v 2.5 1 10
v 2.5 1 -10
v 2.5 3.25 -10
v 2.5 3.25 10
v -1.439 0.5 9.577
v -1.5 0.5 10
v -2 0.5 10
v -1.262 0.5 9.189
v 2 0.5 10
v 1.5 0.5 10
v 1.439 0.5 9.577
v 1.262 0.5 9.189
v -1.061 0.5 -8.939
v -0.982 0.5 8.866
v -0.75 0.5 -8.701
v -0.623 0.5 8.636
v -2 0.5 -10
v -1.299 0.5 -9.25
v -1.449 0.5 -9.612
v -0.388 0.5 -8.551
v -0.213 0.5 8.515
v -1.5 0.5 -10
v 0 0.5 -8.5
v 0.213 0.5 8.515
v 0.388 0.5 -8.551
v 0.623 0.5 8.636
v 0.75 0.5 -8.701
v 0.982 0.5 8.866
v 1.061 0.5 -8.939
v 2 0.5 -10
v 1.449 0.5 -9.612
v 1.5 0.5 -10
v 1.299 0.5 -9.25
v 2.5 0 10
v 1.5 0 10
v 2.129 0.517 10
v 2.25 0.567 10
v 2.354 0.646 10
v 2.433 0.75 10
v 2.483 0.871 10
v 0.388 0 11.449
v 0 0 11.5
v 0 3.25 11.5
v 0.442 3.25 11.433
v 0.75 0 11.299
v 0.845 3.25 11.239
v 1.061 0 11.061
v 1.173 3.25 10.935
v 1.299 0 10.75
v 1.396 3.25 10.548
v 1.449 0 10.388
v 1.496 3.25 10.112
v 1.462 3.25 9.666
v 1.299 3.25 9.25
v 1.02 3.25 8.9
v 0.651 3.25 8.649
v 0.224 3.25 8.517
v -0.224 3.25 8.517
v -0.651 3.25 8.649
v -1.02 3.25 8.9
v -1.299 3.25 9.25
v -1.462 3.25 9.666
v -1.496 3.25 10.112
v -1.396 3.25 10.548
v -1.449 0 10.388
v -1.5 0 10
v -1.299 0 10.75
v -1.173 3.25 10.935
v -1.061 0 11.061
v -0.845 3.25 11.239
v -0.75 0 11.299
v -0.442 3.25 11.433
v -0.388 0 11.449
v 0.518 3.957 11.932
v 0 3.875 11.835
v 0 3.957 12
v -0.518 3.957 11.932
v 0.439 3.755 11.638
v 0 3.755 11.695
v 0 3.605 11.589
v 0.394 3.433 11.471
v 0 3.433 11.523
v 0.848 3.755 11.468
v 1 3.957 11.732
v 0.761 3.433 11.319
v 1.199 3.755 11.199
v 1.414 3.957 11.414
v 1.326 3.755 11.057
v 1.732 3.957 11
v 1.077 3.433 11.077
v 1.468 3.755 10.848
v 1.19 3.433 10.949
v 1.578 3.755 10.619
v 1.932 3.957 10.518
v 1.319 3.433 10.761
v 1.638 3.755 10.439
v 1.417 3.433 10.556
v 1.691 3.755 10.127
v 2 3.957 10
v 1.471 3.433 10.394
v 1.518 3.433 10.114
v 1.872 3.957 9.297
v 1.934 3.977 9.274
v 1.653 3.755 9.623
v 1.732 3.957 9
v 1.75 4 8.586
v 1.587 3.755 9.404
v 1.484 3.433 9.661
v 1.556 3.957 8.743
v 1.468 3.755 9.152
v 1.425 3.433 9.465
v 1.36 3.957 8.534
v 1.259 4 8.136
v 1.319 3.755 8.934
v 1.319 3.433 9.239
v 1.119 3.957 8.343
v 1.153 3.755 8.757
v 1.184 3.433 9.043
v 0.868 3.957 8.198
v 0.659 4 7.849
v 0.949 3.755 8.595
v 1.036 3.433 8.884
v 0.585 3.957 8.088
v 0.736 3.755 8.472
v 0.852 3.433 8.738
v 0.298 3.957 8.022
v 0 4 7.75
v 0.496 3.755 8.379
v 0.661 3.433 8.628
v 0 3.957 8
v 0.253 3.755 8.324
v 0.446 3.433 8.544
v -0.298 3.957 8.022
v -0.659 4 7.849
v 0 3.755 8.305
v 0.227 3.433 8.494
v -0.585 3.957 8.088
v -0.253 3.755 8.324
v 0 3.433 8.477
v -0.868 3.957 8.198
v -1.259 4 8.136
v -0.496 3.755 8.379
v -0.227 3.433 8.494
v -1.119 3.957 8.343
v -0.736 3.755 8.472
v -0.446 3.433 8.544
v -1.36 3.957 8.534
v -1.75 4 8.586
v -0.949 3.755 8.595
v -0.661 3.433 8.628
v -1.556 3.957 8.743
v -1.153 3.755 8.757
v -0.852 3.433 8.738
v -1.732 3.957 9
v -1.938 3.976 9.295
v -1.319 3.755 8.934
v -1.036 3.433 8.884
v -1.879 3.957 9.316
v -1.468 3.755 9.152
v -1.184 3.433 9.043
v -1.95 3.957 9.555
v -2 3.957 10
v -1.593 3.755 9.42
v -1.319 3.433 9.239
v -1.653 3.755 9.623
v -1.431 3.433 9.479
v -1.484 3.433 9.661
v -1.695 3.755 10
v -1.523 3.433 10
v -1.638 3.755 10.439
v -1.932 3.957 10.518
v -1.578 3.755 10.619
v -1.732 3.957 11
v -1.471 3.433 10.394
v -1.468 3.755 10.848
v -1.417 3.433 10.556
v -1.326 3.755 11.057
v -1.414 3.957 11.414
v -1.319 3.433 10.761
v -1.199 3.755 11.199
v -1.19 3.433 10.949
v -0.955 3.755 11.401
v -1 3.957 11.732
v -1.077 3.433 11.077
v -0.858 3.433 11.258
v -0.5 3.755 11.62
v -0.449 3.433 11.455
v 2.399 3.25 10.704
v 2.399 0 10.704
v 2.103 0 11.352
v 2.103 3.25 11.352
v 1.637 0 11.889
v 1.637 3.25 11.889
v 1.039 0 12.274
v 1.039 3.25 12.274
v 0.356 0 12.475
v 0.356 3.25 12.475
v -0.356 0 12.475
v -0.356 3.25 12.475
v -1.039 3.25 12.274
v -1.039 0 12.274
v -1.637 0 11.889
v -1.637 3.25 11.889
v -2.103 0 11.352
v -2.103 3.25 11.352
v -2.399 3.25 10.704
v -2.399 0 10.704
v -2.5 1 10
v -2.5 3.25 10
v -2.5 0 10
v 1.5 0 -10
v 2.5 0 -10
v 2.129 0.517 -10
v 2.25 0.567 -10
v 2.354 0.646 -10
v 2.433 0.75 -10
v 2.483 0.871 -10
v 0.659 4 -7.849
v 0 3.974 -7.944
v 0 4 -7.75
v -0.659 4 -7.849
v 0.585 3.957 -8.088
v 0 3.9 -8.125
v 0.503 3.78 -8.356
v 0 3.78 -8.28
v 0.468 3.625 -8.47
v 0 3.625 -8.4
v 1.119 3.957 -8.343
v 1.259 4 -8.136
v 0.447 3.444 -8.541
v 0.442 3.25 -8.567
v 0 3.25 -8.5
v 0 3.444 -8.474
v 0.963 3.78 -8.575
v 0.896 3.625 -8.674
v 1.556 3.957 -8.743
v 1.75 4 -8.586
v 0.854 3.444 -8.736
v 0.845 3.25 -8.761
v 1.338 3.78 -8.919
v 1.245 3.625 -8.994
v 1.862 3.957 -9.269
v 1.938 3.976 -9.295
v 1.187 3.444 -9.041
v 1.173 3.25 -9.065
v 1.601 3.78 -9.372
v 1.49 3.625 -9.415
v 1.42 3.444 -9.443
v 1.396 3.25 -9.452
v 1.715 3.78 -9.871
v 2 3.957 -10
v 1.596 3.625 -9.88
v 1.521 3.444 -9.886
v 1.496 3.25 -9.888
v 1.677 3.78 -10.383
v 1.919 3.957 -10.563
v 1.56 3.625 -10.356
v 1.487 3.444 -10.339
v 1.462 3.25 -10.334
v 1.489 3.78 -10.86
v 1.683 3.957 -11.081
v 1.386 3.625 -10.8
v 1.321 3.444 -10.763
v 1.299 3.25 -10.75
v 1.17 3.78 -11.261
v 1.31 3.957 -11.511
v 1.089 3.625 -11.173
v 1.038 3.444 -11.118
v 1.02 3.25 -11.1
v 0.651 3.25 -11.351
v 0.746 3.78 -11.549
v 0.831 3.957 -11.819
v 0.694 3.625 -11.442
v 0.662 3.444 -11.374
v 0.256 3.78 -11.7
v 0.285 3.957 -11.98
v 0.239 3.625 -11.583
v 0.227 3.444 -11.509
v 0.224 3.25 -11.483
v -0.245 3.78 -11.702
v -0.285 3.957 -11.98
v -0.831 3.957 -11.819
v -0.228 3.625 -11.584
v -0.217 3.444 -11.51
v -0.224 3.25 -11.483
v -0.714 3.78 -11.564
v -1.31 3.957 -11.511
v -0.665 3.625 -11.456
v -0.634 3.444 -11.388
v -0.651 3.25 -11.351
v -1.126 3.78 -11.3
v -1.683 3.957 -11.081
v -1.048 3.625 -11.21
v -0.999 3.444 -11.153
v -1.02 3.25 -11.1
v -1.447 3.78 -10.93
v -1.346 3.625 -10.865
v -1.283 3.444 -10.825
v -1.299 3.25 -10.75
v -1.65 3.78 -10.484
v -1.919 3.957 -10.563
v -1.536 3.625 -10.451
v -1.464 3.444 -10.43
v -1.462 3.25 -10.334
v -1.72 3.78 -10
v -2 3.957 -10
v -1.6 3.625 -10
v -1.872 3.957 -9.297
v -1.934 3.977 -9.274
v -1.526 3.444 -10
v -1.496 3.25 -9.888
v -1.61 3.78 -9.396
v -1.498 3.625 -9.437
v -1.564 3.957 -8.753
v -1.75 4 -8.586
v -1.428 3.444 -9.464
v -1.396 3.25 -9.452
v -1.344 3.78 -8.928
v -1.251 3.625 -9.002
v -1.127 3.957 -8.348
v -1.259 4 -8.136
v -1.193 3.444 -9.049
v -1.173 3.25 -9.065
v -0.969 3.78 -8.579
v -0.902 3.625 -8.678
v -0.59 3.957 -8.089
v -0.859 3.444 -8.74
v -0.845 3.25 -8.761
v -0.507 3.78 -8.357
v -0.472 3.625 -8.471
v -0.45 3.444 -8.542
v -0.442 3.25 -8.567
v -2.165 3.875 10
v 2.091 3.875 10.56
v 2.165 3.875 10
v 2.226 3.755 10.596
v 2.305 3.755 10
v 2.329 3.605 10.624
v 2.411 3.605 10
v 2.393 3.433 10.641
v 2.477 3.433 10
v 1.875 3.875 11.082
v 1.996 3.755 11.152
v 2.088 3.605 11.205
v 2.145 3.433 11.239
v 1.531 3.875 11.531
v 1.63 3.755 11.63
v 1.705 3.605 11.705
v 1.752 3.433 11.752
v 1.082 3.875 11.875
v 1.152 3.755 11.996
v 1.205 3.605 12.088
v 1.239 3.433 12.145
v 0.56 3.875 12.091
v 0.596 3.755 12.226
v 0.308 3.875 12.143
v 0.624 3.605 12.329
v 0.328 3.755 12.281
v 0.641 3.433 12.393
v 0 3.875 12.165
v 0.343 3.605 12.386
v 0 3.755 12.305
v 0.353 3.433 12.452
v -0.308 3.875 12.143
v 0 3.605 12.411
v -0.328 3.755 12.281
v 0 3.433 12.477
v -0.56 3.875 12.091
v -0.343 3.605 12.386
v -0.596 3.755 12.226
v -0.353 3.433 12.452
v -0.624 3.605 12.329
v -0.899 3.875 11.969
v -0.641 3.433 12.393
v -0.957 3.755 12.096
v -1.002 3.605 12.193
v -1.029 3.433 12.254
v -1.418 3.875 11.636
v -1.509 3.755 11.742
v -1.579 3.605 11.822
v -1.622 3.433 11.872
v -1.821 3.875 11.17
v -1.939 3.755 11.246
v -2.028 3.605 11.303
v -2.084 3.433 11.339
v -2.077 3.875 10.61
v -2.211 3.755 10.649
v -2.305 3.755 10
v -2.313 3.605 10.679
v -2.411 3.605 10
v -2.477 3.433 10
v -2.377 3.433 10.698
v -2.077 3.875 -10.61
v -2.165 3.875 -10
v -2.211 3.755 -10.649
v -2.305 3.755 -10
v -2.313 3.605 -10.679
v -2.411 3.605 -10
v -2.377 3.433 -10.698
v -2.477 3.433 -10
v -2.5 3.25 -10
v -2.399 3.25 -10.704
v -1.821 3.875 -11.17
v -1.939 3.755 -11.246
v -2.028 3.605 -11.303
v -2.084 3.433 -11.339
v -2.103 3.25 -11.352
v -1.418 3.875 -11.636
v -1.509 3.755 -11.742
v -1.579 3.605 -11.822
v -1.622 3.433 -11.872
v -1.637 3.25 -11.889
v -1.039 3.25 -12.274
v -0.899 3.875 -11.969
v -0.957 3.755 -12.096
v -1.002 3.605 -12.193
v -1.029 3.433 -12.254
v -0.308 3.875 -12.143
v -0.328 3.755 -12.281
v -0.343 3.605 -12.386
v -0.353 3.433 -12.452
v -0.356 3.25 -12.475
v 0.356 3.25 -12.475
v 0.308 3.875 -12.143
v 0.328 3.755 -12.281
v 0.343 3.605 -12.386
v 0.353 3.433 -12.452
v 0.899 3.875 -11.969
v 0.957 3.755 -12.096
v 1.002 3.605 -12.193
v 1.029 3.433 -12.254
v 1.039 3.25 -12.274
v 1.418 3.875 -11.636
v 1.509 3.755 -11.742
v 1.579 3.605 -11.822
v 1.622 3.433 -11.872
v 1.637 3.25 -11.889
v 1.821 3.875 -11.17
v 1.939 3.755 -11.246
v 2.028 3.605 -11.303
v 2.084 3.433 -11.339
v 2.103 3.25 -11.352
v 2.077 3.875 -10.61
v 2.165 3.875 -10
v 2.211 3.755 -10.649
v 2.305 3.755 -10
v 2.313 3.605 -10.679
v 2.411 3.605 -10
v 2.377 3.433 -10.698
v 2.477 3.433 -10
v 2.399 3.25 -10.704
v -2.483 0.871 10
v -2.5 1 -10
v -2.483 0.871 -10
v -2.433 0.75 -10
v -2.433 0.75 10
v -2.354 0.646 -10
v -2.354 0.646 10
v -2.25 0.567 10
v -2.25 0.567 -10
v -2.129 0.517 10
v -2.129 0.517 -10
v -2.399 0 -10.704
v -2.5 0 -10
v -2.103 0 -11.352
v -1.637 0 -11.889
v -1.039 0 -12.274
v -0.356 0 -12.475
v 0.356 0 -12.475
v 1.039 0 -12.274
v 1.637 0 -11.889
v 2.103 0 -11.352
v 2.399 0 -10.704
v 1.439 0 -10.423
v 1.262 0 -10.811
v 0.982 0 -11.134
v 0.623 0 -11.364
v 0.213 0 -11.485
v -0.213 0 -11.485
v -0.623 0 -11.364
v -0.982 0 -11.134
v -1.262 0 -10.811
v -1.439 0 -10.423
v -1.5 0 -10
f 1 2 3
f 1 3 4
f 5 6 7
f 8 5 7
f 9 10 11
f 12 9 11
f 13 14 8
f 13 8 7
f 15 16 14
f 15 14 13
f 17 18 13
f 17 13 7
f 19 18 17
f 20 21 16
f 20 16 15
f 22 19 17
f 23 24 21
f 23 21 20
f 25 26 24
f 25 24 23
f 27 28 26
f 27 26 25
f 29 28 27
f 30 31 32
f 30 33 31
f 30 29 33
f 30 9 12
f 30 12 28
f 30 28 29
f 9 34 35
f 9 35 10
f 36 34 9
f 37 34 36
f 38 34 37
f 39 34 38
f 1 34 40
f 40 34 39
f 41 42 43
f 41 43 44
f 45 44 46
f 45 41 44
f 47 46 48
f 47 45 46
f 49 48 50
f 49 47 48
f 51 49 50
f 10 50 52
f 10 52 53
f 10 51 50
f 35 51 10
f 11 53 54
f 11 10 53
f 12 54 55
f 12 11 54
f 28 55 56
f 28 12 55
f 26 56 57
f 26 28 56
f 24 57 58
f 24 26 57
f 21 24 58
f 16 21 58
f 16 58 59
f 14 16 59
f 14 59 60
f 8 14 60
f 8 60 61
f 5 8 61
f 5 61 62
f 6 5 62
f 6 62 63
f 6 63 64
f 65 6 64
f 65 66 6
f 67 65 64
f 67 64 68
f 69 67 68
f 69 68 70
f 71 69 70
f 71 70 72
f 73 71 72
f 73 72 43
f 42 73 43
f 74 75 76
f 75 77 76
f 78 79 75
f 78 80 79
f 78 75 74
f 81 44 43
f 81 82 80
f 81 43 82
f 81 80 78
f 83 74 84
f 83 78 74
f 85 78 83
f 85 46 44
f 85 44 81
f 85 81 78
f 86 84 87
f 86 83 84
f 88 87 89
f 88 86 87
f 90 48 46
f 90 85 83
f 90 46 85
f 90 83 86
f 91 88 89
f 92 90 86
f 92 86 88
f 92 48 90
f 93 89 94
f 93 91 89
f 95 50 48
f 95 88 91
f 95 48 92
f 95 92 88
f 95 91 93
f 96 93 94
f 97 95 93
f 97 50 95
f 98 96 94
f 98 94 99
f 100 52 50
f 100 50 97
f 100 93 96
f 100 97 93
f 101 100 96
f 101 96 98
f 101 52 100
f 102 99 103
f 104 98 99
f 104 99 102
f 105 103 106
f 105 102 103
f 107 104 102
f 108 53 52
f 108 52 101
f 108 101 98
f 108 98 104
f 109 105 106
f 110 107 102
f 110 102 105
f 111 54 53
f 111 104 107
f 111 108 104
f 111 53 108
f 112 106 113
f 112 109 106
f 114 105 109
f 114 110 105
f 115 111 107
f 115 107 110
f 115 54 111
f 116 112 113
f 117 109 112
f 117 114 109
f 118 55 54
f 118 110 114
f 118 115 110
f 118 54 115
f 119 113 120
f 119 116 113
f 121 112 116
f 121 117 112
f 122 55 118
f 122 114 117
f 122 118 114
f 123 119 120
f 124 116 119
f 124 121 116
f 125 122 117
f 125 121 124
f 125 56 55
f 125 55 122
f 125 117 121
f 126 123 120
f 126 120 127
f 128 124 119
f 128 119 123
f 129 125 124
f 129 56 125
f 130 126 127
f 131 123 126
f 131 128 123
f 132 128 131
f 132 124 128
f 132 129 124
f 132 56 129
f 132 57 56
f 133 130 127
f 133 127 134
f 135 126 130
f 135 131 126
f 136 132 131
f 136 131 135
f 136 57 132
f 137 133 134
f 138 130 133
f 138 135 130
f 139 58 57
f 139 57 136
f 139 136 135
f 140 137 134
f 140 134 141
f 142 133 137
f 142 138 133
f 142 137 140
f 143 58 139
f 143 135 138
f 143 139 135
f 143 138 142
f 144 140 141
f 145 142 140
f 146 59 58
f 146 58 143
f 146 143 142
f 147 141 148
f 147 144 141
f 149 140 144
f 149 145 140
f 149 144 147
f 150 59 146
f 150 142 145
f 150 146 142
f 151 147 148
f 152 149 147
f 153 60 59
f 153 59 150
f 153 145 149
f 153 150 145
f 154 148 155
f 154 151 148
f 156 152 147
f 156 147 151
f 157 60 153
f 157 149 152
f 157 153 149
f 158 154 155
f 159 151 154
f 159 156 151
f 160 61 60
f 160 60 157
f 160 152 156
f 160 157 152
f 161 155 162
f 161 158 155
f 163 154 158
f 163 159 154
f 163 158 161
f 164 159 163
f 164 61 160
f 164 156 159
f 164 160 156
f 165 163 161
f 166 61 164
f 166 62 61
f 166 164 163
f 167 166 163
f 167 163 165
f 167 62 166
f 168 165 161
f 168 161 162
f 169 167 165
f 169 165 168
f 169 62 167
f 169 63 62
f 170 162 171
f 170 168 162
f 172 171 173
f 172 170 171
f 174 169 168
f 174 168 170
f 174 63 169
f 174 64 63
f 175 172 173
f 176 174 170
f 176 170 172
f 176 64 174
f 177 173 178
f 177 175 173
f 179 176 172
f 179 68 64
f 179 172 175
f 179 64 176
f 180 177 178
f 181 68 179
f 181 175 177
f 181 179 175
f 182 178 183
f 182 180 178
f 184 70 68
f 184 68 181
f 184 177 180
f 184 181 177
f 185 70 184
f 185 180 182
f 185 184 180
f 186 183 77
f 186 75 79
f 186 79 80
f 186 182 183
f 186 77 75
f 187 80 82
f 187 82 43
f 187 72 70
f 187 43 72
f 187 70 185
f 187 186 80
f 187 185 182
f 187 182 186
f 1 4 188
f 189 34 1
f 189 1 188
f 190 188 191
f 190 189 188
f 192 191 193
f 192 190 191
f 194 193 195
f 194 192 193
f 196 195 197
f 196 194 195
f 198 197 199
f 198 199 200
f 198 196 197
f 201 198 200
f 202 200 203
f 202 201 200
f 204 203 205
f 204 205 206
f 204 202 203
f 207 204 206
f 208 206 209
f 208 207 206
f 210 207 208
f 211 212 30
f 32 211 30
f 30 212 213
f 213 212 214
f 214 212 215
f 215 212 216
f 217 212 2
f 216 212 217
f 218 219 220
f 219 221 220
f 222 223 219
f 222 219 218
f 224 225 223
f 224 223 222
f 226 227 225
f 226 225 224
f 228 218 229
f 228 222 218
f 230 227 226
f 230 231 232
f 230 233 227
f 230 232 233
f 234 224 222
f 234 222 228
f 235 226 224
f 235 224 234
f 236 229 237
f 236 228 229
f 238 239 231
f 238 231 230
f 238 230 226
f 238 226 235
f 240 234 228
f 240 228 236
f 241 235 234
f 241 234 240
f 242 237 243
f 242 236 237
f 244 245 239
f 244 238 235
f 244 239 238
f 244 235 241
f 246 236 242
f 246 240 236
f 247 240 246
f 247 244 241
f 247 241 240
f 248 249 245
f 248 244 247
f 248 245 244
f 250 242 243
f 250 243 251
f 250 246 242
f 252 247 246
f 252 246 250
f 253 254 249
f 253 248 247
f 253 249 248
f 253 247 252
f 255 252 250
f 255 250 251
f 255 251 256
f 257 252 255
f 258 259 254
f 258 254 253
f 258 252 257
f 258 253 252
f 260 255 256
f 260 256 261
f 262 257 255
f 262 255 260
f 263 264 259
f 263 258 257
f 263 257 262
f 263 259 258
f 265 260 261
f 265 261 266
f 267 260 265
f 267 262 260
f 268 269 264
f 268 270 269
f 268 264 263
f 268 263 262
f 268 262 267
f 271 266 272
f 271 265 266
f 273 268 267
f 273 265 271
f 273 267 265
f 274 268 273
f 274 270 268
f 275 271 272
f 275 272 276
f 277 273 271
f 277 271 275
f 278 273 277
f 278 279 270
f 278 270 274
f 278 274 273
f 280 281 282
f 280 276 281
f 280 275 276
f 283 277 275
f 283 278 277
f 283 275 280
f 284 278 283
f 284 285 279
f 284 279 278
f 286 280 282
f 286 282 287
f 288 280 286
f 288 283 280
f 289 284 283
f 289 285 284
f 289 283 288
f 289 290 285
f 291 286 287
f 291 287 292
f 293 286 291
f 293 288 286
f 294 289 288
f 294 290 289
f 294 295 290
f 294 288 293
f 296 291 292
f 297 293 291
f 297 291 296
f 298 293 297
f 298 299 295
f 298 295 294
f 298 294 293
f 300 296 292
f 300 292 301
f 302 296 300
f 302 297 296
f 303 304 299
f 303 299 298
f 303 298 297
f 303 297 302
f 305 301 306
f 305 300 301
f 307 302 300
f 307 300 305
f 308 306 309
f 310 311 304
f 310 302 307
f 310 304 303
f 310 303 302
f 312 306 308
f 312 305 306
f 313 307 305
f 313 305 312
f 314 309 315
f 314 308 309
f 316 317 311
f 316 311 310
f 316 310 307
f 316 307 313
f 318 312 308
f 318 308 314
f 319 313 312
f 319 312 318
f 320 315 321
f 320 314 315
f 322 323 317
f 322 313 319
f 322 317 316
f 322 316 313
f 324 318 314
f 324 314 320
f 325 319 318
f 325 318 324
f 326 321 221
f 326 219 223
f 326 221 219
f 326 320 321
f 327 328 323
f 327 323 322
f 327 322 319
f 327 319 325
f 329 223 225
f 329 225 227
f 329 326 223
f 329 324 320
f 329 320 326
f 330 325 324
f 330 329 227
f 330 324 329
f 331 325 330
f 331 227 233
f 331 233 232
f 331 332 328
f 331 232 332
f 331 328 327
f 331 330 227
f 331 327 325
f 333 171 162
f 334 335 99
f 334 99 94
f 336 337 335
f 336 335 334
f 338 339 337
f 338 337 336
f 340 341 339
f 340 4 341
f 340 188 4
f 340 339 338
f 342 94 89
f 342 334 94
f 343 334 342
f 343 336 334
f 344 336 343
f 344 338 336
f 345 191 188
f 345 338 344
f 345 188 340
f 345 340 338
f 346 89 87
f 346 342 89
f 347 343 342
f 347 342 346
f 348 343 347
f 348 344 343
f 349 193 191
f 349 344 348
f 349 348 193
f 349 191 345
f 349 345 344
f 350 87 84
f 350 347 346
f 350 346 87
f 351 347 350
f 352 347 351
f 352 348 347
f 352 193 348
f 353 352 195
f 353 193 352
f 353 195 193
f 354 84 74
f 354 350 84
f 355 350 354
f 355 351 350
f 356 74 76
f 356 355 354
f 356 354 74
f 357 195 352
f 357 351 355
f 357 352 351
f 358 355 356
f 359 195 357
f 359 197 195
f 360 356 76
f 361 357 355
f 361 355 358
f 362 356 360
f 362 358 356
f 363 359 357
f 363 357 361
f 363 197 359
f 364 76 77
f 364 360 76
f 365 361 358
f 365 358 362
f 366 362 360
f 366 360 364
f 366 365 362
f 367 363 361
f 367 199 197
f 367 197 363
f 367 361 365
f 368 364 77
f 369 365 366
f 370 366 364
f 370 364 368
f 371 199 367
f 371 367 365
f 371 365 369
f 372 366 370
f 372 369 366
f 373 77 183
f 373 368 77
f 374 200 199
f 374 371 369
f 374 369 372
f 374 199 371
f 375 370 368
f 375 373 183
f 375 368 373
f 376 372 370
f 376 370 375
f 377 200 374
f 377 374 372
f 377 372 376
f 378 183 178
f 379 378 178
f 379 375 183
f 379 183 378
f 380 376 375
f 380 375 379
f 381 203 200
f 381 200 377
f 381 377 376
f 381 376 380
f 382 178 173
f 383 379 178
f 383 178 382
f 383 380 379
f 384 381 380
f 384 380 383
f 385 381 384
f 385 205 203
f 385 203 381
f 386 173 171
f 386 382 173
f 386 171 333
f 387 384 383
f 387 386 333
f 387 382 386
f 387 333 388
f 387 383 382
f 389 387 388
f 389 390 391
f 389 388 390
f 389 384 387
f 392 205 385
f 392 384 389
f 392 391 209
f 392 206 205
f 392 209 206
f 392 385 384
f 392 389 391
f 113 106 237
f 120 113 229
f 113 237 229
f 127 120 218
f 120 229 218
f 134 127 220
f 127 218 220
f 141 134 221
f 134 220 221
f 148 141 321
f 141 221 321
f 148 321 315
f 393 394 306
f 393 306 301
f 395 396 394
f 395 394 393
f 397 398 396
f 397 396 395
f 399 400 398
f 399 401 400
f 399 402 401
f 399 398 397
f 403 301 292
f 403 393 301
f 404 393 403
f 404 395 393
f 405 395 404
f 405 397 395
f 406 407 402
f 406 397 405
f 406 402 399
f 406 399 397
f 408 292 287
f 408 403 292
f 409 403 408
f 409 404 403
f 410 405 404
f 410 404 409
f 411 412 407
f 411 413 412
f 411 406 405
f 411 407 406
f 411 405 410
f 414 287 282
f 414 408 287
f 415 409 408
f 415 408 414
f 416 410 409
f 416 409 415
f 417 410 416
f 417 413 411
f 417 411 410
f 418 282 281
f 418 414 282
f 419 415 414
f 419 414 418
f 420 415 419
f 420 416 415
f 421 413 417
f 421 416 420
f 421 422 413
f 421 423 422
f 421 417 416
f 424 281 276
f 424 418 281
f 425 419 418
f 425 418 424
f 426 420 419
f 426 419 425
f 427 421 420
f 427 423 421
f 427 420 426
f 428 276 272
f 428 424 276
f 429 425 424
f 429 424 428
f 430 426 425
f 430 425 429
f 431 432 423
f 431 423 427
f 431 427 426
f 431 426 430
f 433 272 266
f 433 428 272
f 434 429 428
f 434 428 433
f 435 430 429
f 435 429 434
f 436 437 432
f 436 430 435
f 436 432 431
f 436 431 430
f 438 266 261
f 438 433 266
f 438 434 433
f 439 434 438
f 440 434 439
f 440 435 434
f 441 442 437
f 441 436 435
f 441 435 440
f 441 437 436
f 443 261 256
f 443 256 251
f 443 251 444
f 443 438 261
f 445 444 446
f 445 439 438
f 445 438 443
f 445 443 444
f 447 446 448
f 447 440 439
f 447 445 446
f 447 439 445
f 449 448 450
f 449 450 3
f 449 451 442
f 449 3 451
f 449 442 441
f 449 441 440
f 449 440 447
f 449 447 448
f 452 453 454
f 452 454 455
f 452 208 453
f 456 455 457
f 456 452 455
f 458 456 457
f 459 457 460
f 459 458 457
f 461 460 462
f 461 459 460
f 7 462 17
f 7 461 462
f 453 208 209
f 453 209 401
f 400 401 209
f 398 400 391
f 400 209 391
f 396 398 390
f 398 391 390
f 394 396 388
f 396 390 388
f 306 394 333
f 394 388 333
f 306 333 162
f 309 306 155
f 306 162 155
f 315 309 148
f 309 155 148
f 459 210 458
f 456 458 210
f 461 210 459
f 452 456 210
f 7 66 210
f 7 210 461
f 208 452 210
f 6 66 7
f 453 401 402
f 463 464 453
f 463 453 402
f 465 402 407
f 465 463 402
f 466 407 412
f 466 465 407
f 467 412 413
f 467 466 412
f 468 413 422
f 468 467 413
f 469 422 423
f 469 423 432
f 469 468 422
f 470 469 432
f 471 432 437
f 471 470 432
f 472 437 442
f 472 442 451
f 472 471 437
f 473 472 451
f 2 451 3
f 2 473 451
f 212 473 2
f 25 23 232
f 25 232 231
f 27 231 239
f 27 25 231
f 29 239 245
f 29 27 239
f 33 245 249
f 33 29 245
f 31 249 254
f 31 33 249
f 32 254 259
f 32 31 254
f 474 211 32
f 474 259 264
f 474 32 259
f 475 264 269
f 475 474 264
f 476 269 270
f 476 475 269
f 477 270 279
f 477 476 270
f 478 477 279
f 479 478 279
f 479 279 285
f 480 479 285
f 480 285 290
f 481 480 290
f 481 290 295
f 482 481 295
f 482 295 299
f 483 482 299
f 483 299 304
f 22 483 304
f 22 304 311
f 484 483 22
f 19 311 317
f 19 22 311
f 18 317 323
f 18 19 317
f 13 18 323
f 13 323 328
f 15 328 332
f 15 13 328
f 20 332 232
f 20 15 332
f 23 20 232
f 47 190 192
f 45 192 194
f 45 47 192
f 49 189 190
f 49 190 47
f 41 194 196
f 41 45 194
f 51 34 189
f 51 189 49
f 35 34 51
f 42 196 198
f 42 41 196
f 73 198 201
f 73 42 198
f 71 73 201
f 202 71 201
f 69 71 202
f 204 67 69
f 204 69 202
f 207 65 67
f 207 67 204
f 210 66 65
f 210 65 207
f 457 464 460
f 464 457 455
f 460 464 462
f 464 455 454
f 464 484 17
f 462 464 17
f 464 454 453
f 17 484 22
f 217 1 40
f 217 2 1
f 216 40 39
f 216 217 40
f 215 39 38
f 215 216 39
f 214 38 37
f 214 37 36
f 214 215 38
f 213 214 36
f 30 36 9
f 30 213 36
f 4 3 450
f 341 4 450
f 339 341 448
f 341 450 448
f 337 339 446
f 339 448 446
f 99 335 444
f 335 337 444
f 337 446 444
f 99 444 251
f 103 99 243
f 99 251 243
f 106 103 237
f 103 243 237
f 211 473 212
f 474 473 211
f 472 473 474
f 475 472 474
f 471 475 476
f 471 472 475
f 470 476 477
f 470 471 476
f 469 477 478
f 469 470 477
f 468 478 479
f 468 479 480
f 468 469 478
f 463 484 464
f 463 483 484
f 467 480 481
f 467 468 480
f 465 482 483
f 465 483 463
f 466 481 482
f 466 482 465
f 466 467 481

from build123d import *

# Parameters (mm, degrees)
SKETCH1_R           = 1.5
BOSS_EXTRUDE1_DEPTH = 4
SKETCH2_W           = 20
SKETCH2_H           = 0.5
CUT_EXTRUDE1_DEPTH  = 15.044571905
FILLET1_R           = 0.5
FILLET2_R           = 0.75


with BuildPart() as part:
    # Sketch1 → Boss-Extrude1 (new body)
    with BuildSketch(Plane(origin=(0, 0, 0), x_dir=(1, 0, 0), z_dir=(0, 1, 0))):
        with BuildLine():
            Line((-2.5, -10), (-2.5, 10))
            ThreePointArc((-2.5, 10), (0, 12.5), (2.5, 10))
            Line((2.5, 10), (2.5, -10))
            ThreePointArc((2.5, -10), (0, -12.5), (-2.5, -10))
        make_face()
        with Locations(Location((0, -10, 0), (0, 0, 270))):
            Circle(SKETCH1_R, mode=Mode.SUBTRACT)
        with Locations(Location((0, 10, 0), (0, 0, 270))):
            Circle(SKETCH1_R, mode=Mode.SUBTRACT)
    extrude(amount=BOSS_EXTRUDE1_DEPTH)

    # Sketch2 → Cut-Extrude1 (cut, through all)
    with BuildSketch(Plane(origin=(2.5, 0, 0), x_dir=(0, 0, -1), z_dir=(1, 0, 0))):
        with Locations((0, 0.25)):
            Rectangle(SKETCH2_W, SKETCH2_H)
    extrude(amount=-CUT_EXTRUDE1_DEPTH, mode=Mode.SUBTRACT)

    # Fillet1
    fillet1_edges = [part.edges().sort_by_distance(p)[0] for p in [
        (2.5, 0.5, 0),
        (-2.5, 0.5, 0),
    ]]
    fillet(fillet1_edges, radius=FILLET1_R)

    # Fillet2
    # the kernel refuses this fillet: 0.75 mm, written as the material it takes off along each edge
    with BuildSketch(Plane(origin=(0, 4, 10), x_dir=(0, 0, 1), z_dir=(-1, 0, 0))) as fillet2_piece_1:
        with BuildLine():
            CenterArc((1.5 + FILLET2_R, -FILLET2_R), FILLET2_R, 90, 90)
            Line((1.5 + FILLET2_R, 0), (1.5, 0))
            Line((1.5, 0), (1.5, -FILLET2_R))
        make_face()
    revolve(axis=Axis((0, 4, 10), (0, 1, 0)), mode=Mode.SUBTRACT)
    with BuildSketch(Plane(origin=(0, 4, -10), x_dir=(-1, 0, 0), z_dir=(0, 0, 1))) as fillet2_piece_2:
        with BuildLine():
            CenterArc((2.5 - FILLET2_R, FILLET2_R), FILLET2_R, 270, 90)
            Line((2.5 - FILLET2_R, 0), (2.5, 0))
            Line((2.5, 0), (2.5, FILLET2_R))
        make_face()
    revolve(axis=Axis((0, 4, -10), (0, -1, 0)), revolution_arc=180, mode=Mode.SUBTRACT)
    with BuildSketch(Plane(origin=(0, 4, -10), x_dir=(0, 0, 1), z_dir=(-1, 0, 0))) as fillet2_piece_3:
        with BuildLine():
            CenterArc((1.5 + FILLET2_R, -FILLET2_R), FILLET2_R, 90, 90)
            Line((1.5 + FILLET2_R, 0), (1.5, 0))
            Line((1.5, 0), (1.5, -FILLET2_R))
        make_face()
    revolve(axis=Axis((0, 4, -10), (0, 1, 0)), mode=Mode.SUBTRACT)
    with BuildSketch(Plane(origin=(-2.5, 4, 10), x_dir=(1, 0, 0), z_dir=(0, 0, -1))) as fillet2_piece_4:
        with BuildLine():
            CenterArc((FILLET2_R, FILLET2_R), FILLET2_R, 180, 90)
            Line((0, FILLET2_R), (0, 0))
            Line((0, 0), (FILLET2_R, 0))
        make_face()
    extrude(amount=20, mode=Mode.SUBTRACT)
    with BuildSketch(Plane(origin=(0, 4, 10), x_dir=(1, 0, 0), z_dir=(0, 0, -1))) as fillet2_piece_5:
        with BuildLine():
            CenterArc((2.5 - FILLET2_R, FILLET2_R), FILLET2_R, 270, 90)
            Line((2.5 - FILLET2_R, 0), (2.5, 0))
            Line((2.5, 0), (2.5, FILLET2_R))
        make_face()
    revolve(axis=Axis((0, 4, 10), (0, -1, 0)), revolution_arc=180, mode=Mode.SUBTRACT)
    with BuildSketch(Plane(origin=(2.5, 4, -10), x_dir=(0, -1, 0), z_dir=(0, 0, 1))) as fillet2_piece_6:
        with BuildLine():
            CenterArc((FILLET2_R, -FILLET2_R), FILLET2_R, 90, 90)
            Line((0, -FILLET2_R), (0, 0))
            Line((0, 0), (FILLET2_R, 0))
        make_face()
    extrude(amount=20, mode=Mode.SUBTRACT)


solid = part.part
